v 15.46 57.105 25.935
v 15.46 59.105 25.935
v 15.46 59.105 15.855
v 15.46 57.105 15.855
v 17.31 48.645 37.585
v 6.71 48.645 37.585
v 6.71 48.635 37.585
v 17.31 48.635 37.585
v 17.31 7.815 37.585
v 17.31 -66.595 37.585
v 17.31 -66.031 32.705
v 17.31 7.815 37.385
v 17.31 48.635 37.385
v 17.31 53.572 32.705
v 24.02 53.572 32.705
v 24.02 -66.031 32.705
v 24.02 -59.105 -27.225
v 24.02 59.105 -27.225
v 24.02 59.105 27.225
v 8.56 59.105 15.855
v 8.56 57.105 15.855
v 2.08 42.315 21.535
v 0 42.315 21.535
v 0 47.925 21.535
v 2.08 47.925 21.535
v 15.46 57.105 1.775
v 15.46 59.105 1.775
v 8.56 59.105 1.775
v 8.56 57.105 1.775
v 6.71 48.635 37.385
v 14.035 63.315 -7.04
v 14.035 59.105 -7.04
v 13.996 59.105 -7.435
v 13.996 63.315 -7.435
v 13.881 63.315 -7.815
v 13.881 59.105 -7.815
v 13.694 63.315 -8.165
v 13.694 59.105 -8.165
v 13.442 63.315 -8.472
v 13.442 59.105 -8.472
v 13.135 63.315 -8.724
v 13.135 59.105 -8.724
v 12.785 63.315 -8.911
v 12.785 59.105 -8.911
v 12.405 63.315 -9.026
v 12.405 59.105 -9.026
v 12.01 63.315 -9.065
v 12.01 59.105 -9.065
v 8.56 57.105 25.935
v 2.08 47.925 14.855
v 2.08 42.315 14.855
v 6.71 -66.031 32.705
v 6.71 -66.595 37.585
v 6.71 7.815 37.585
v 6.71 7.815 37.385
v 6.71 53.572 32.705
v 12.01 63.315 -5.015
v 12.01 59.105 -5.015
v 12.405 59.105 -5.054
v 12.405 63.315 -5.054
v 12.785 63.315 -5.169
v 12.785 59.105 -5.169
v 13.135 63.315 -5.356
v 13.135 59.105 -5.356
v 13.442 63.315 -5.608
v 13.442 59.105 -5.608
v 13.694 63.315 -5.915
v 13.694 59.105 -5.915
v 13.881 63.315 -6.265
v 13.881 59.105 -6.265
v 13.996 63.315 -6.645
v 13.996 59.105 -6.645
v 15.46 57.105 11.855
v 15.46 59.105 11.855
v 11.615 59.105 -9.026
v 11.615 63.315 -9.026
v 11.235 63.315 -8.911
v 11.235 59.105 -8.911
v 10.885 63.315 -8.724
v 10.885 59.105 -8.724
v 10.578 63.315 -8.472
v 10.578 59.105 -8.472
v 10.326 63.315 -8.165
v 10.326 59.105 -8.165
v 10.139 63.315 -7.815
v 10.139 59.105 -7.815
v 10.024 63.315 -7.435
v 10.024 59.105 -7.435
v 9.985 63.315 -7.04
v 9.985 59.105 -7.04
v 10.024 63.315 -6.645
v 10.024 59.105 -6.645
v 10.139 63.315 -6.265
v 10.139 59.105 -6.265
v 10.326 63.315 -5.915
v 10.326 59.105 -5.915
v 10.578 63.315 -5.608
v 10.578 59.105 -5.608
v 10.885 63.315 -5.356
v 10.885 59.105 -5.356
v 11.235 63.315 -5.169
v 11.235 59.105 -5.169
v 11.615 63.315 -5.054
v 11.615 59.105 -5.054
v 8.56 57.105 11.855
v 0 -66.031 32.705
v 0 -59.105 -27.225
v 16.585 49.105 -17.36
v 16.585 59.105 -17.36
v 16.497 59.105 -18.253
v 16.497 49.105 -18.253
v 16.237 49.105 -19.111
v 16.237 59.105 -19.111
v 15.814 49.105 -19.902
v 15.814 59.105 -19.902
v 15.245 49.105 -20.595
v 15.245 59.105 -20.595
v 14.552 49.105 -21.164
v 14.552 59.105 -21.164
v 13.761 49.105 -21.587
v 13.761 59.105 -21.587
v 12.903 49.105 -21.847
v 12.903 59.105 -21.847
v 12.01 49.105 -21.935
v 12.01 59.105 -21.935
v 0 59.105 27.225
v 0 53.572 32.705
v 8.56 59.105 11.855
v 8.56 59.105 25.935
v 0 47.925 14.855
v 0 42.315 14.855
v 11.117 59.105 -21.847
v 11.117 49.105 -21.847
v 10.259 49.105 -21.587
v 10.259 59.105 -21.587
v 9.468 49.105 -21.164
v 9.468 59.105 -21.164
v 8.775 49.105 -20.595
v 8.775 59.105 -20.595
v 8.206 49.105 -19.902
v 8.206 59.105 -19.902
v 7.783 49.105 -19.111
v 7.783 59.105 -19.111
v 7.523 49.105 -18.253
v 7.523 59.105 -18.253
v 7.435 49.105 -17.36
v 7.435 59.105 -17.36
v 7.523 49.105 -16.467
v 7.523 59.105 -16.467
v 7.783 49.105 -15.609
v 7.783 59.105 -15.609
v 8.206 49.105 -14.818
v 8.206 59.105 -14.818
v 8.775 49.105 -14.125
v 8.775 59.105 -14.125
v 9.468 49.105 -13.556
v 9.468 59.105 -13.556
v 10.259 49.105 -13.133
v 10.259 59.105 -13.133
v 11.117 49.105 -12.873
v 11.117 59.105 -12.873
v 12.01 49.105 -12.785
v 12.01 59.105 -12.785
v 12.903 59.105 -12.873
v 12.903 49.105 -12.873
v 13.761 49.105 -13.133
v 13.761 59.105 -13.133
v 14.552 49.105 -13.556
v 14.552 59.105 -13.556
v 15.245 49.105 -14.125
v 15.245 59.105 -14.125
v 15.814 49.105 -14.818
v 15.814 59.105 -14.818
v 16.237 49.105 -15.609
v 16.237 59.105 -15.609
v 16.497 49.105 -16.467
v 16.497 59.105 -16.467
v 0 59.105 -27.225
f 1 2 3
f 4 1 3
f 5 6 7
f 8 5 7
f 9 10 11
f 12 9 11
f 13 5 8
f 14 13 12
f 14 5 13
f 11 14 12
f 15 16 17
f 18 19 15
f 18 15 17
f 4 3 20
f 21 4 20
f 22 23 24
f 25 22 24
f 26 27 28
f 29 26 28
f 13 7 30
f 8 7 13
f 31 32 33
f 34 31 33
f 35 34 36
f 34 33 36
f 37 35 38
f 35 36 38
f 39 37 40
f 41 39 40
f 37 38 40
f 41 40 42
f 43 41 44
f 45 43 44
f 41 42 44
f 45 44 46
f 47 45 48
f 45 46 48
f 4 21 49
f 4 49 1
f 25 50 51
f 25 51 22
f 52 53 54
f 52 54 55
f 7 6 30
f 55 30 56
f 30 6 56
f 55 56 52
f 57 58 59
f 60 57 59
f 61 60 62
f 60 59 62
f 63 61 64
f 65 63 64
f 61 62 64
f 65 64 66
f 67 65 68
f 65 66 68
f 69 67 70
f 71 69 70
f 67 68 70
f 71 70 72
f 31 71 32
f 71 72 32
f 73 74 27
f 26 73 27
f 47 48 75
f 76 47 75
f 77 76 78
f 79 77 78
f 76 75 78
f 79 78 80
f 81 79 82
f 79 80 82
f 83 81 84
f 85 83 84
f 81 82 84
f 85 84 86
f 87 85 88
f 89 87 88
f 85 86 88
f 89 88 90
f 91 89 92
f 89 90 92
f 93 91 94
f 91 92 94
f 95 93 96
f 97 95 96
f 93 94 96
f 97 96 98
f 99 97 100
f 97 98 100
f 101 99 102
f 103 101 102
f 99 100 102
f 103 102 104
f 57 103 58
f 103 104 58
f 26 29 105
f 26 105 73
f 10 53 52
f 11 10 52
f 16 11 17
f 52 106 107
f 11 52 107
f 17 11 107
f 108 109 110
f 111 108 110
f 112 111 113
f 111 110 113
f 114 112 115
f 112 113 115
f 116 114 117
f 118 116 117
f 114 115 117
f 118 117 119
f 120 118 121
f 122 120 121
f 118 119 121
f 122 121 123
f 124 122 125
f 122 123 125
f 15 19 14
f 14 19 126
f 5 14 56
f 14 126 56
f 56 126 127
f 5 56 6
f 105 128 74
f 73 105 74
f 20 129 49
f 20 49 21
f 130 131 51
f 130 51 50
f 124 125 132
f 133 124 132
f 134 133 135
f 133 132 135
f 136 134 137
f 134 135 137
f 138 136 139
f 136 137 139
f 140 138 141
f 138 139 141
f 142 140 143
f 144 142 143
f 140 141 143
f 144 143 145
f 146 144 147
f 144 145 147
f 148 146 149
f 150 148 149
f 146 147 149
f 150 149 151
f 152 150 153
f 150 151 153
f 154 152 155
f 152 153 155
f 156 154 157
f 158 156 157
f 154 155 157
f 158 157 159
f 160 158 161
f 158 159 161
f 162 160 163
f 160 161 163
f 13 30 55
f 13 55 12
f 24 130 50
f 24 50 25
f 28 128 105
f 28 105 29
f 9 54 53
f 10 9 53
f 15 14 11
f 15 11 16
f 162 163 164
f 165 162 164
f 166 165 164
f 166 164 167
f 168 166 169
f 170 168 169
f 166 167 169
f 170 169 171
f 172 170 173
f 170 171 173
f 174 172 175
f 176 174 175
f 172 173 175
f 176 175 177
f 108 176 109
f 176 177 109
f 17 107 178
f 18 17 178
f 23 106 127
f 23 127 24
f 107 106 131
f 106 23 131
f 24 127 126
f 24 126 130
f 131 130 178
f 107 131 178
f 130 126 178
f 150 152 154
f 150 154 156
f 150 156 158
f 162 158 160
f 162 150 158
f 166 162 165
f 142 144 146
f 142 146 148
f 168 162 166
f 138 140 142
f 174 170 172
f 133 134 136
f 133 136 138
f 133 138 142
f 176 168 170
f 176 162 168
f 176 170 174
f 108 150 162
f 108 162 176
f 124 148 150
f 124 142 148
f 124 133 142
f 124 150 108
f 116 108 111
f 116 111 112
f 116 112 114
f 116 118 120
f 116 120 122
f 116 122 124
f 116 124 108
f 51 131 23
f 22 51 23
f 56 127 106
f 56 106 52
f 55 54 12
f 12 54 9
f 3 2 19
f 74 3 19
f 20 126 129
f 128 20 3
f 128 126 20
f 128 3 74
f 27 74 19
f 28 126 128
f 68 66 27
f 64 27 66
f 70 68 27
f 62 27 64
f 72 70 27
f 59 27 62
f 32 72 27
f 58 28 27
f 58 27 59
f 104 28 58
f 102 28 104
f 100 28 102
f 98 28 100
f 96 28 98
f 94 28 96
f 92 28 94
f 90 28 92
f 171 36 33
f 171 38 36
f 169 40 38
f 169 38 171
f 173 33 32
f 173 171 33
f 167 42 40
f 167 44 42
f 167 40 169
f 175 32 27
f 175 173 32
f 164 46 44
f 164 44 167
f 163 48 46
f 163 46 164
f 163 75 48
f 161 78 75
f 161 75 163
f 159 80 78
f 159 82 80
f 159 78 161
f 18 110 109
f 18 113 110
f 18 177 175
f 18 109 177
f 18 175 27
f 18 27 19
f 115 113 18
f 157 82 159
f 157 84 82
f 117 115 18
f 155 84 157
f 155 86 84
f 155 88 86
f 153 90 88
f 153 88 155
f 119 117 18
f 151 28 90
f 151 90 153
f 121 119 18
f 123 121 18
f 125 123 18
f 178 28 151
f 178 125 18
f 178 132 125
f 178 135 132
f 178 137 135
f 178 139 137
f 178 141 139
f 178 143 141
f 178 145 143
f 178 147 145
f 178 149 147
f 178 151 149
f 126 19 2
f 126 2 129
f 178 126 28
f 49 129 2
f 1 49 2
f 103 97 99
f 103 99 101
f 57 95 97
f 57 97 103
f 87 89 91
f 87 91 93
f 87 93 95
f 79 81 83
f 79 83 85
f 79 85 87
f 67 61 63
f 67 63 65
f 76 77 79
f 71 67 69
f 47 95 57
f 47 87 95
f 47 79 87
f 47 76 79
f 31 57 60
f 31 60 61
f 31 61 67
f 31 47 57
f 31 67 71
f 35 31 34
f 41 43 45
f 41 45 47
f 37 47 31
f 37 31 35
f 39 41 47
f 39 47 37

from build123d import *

# Parameters (mm, degrees)
SKETCH_1_W          = 54.45
SKETCH_1_H          = 10.46
SKETCH_1_H_2        = 107.75
EXTRUDE_1_DEPTH     = 24.02
CUT_EXTRUDE_1_DEPTH = 10
EXTRUDE_2_DEPTH     = 4.21
SKETCH_4_W          = 3.45
SKETCH_4_H          = 10.08
CUT_EXTRUDE_2_DEPTH = 2
SKETCH_5_W          = 6.71
SKETCH_5_H          = 4.88
CUT_EXTRUDE_4_DEPTH = 134.379468529
SKETCH_7_W          = 5.3
SKETCH_7_H          = 23.4
CUT_EXTRUDE_5_DEPTH = 0.2
SKETCH_8_W          = 10.6
SKETCH_8_H          = 9.42
CUT_EXTRUDE_6_DEPTH = 0.2
SKETCH_9_W          = 10.6
SKETCH_9_H          = 8
CUT_EXTRUDE_7_DEPTH = 0.2
SKETCH_10_W         = 6.68
SKETCH_10_H         = 5.61
CUT_EXTRUDE_8_DEPTH = 2.08


with BuildPart() as part:
    # 草图1 → 凸台-拉伸1 (new body)
    with BuildSketch(Plane(origin=(0, 0, 0), x_dir=(0, 0, -1), z_dir=(1, 0, 0))):
        with Locations((0, 53.875)):
            Rectangle(SKETCH_1_W, SKETCH_1_H)
        with Locations((0, -5.23)):
            Rectangle(SKETCH_1_W, SKETCH_1_H_2)
        Polygon((-37.585, -66.595), (27.225, -59.105), (-27.225, -59.105), (-27.225, 48.645), (-37.585, 48.645), align=None)
        Polygon((-27.225, 59.105), (-37.585, 48.645), (-27.225, 48.645), align=None)
    extrude(amount=EXTRUDE_1_DEPTH)

    # 草图2 → 切除-拉伸1 (cut)
    with BuildSketch(Plane(origin=(0, 59.105, 0), x_dir=(1, 0, 0), z_dir=(0, 1, 0))):
        with BuildLine():
            ThreePointArc((16.585, 17.36), (15.245013524, 20.595013524), (12.01, 21.935))
            Line((12.01, 21.935), (12.01, 12.785))
            ThreePointArc((12.01, 12.785), (15.245013524, 14.124986476), (16.585, 17.36))
        make_face()
        with BuildLine():
            Line((12.01, 12.785), (12.01, 21.935))
            ThreePointArc((12.01, 21.935), (7.435, 17.36), (12.01, 12.785))
        make_face()
    extrude(amount=-CUT_EXTRUDE_1_DEPTH, mode=Mode.SUBTRACT)

    # 草图3 → 凸台-拉伸2 (add)
    with BuildSketch(Plane(origin=(0, 59.105, 0), x_dir=(1, 0, 0), z_dir=(0, 1, 0))):
        with BuildLine():
            ThreePointArc((14.035, 7.04), (13.441891232, 8.471891232), (12.01, 9.065))
            Line((12.01, 9.065), (12.01, 5.015))
            ThreePointArc((12.01, 5.015), (13.441891232, 5.608108768), (14.035, 7.04))
        make_face()
        with BuildLine():
            Line((12.01, 5.015), (12.01, 9.065))
            ThreePointArc((12.01, 9.065), (9.985, 7.04), (12.01, 5.015))
        make_face()
    extrude(amount=EXTRUDE_2_DEPTH)

    # 草图4 → 切除-拉伸2 (cut)
    with BuildSketch(Plane(origin=(0, 59.105, 0), x_dir=(1, 0, 0), z_dir=(0, 1, 0))):
        with Locations((13.735, -6.815)):
            Rectangle(SKETCH_4_W, SKETCH_4_H)
        with Locations((10.285, -6.815)):
            Rectangle(SKETCH_4_W, SKETCH_4_H)
        with Locations((10.285, -20.895)):
            Rectangle(SKETCH_4_W, SKETCH_4_H)
        with Locations((13.735, -20.895)):
            Rectangle(SKETCH_4_W, SKETCH_4_H)
    extrude(amount=-CUT_EXTRUDE_2_DEPTH, mode=Mode.SUBTRACT)

    # 草图5 → 切除-拉伸4 (cut, through all)
    with BuildSketch(Plane(origin=(0, 59.105, 0), x_dir=(1, 0, 0), z_dir=(0, 1, 0))):
        with Locations((3.355, -35.145)):
            Rectangle(SKETCH_5_W, SKETCH_5_H)
        with Locations((20.665, -35.145)):
            Rectangle(SKETCH_5_W, SKETCH_5_H)
    extrude(amount=-CUT_EXTRUDE_4_DEPTH, mode=Mode.SUBTRACT)

    # 草图7 → 切除-拉伸5 (cut)
    with BuildSketch(Plane.XY.offset(37.585)):
        with Locations((9.36, 27.515)):
            Rectangle(SKETCH_7_W, SKETCH_7_H)
        with Locations((14.66, 27.515)):
            Rectangle(SKETCH_7_W, SKETCH_7_H)
    extrude(amount=-CUT_EXTRUDE_5_DEPTH, mode=Mode.SUBTRACT)

    # 草图8 → 切除-拉伸6 (cut)
    with BuildSketch(Plane.XY.offset(37.585)):
        with Locations((12.01, 43.925)):
            Rectangle(SKETCH_8_W, SKETCH_8_H)
    extrude(amount=-CUT_EXTRUDE_6_DEPTH, mode=Mode.SUBTRACT)

    # 草图9 → 切除-拉伸7 (cut)
    with BuildSketch(Plane.XY.offset(37.585)):
        with Locations((12.01, 11.815)):
            Rectangle(SKETCH_9_W, SKETCH_9_H)
    extrude(amount=-CUT_EXTRUDE_7_DEPTH, mode=Mode.SUBTRACT)

    # 草图10 → 切除-拉伸8 (cut)
    with BuildSketch(Plane.ZY):
        with Locations((18.195, 45.12)):
            Rectangle(SKETCH_10_W, SKETCH_10_H)
    extrude(amount=-CUT_EXTRUDE_8_DEPTH, mode=Mode.SUBTRACT)


solid = part.part
